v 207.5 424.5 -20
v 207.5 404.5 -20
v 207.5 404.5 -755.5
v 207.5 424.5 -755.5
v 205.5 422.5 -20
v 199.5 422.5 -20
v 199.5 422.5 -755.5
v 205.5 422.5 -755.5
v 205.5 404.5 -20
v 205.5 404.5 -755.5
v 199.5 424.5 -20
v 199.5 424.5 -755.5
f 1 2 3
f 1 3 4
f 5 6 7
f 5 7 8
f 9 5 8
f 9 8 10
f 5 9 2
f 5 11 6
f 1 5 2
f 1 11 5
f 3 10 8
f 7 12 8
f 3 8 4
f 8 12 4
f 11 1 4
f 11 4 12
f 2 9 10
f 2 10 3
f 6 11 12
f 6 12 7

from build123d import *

# Parameters (mm, degrees)
STORE_KASET_L_RAF_1_SAG_1_START = -20
STORE_KASET_L_RAF_1_SAG_1_DEPTH = 735.5


with BuildPart() as part:
    # Sketch1 → STORE_kaset_L_raf_1_sag_1 (new body)
    with BuildSketch(Plane.XY.offset(STORE_KASET_L_RAF_1_SAG_1_START)):
        Polygon((205.5, 404.5), (207.5, 404.5), (207.5, 424.5), (199.5, 424.5), (199.5, 422.5), (205.5, 422.5), align=None)
    extrude(amount=-STORE_KASET_L_RAF_1_SAG_1_DEPTH)


solid = part.part
